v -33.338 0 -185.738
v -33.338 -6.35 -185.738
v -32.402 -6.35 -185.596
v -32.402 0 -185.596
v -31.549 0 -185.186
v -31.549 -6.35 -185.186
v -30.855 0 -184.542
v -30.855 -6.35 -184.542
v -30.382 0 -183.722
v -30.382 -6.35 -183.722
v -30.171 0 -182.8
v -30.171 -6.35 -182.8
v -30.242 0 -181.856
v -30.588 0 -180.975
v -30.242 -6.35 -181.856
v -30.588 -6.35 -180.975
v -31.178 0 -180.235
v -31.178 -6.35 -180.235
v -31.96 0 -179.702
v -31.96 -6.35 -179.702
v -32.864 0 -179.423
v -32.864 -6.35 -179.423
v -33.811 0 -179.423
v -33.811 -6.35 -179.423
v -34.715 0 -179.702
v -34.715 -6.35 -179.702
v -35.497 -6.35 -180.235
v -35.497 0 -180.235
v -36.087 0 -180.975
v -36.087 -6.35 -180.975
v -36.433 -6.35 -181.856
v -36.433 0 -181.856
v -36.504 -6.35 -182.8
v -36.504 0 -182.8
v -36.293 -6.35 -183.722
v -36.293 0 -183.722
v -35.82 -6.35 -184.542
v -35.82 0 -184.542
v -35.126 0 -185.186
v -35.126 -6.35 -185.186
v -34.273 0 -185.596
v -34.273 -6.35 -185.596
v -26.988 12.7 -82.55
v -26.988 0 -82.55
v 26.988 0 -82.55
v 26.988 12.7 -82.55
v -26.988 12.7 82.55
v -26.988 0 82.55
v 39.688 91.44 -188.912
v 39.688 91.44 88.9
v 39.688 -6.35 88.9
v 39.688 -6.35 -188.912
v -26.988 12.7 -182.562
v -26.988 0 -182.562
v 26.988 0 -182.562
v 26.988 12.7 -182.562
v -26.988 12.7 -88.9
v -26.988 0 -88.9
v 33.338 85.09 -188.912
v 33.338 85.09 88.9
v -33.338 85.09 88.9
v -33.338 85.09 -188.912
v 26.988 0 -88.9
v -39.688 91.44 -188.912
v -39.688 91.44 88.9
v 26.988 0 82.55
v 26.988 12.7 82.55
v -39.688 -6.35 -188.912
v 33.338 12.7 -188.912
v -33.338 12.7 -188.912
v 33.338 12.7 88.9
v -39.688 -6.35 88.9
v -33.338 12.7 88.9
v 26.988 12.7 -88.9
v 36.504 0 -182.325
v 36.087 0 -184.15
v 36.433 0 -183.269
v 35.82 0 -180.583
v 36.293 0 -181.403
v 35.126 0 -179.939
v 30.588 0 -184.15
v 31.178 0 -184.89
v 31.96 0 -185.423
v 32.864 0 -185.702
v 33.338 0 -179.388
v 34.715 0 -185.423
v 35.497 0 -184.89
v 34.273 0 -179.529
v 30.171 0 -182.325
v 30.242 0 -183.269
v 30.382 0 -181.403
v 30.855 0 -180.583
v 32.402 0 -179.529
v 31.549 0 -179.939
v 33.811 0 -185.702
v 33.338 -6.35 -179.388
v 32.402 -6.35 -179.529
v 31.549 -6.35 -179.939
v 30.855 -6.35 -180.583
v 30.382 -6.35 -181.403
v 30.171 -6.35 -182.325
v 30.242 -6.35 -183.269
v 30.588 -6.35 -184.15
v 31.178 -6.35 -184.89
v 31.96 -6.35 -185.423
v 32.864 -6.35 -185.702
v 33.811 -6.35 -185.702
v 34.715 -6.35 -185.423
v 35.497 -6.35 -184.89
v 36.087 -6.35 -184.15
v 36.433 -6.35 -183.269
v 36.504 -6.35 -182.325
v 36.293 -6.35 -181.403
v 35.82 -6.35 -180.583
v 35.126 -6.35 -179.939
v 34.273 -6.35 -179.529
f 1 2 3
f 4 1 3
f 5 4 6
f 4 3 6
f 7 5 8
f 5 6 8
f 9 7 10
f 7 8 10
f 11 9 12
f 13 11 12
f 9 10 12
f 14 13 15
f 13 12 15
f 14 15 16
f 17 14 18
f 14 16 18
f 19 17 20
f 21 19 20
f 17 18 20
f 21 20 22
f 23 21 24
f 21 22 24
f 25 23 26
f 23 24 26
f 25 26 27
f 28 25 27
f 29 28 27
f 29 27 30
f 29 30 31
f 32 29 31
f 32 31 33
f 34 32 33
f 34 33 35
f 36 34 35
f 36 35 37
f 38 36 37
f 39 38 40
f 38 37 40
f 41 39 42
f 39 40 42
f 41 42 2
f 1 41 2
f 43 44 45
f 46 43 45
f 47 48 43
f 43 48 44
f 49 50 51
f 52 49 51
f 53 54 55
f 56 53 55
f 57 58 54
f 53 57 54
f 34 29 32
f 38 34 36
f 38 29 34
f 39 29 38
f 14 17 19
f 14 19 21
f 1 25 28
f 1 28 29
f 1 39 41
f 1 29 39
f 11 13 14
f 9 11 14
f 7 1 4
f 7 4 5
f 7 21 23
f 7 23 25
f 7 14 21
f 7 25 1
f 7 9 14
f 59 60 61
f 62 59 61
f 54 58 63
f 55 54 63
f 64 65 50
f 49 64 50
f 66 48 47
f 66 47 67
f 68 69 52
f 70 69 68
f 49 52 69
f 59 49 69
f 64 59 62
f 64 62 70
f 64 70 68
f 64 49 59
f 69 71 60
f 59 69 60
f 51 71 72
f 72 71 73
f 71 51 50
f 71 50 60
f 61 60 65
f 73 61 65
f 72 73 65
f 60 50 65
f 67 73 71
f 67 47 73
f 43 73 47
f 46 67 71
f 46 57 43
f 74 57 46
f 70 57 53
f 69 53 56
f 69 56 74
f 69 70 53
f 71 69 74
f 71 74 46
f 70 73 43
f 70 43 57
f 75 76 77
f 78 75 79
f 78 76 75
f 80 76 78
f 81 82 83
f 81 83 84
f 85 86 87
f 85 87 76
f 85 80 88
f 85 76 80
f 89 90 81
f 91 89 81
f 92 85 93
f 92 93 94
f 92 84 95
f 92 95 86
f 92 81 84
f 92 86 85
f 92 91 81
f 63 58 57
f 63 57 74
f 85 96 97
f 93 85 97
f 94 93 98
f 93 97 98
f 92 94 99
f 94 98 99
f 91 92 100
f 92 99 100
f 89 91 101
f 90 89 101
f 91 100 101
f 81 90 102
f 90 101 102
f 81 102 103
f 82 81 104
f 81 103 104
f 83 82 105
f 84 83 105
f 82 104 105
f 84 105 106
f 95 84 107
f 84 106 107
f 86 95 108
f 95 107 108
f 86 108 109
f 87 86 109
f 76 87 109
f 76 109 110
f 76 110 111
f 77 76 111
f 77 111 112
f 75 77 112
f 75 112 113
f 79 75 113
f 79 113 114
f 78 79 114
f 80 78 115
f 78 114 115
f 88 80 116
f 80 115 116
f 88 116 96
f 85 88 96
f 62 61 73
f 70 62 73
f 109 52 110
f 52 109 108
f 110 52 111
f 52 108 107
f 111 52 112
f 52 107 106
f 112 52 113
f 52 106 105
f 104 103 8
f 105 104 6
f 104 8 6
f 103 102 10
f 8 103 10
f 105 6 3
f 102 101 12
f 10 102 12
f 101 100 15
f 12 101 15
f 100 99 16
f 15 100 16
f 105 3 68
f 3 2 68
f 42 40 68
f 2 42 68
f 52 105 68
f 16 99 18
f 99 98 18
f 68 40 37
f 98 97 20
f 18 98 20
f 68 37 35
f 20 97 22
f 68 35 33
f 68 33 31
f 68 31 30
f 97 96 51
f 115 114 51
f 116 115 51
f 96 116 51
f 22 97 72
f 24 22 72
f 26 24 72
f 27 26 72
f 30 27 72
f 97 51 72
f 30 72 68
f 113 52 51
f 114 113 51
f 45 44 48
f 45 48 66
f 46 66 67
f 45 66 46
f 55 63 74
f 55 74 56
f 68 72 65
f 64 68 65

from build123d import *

# Parameters (mm, degrees)
SKETCH1_W           = 53.975
SKETCH1_H           = 165.1
SKETCH1_H_2         = 93.6625
BOSS_EXTRUDE4_DEPTH = 12.7
SKETCH4_W           = 66.675
SKETCH4_H           = 6.35
BOSS_EXTRUDE5_DEPTH = 277.8125
BOSS_EXTRUDE6_DEPTH = 277.8125
SKETCH6_R           = 3.175
CUT_EXTRUDE3_DEPTH  = 6.35


with BuildPart() as part:
    # Sketch1 → Boss-Extrude4 (new body)
    with BuildSketch(Plane(origin=(0, 0, 0), x_dir=(1, 0, 0), z_dir=(0, 1, 0))):
        Polygon((33.3375, -88.9), (33.3375, 88.9), (33.3375, 188.9125), (-33.3375, 188.9125), (-33.3375, 88.9), (-33.3375, -88.9), align=None)
        Rectangle(SKETCH1_W, SKETCH1_H, mode=Mode.SUBTRACT)
        with Locations((0, 135.73125)):
            Rectangle(SKETCH1_W, SKETCH1_H_2, mode=Mode.SUBTRACT)
    extrude(amount=BOSS_EXTRUDE4_DEPTH)

    # Sketch4 → Boss-Extrude5 (add)
    with BuildSketch(Plane.XY.offset(88.9)):
        with Locations((0, -3.175)):
            Rectangle(SKETCH4_W, SKETCH4_H)
    extrude(amount=-BOSS_EXTRUDE5_DEPTH)

    # Sketch5 → Boss-Extrude6 (add)
    with BuildSketch(Plane.XY.offset(88.9)):
        Polygon((-39.6875, -6.35), (-39.6875, 91.44), (39.6875, 91.44), (39.6875, -6.35), (33.3375, -6.35), (33.3375, 85.09), (-33.3375, 85.09), (-33.3375, -6.35), align=None)
    extrude(amount=-BOSS_EXTRUDE6_DEPTH)

    # Sketch6 → Cut-Extrude3 (cut)
    with BuildSketch(Plane.XZ.offset(6.35)):
        with Locations(Location((-33.3375, -182.5625, 0), (0, 0, 270))):
            Circle(SKETCH6_R)
        with Locations(Location((33.3375, -182.5625, 0), (0, 0, 90))):
            Circle(SKETCH6_R)
    extrude(amount=-CUT_EXTRUDE3_DEPTH, mode=Mode.SUBTRACT)


solid = part.part
